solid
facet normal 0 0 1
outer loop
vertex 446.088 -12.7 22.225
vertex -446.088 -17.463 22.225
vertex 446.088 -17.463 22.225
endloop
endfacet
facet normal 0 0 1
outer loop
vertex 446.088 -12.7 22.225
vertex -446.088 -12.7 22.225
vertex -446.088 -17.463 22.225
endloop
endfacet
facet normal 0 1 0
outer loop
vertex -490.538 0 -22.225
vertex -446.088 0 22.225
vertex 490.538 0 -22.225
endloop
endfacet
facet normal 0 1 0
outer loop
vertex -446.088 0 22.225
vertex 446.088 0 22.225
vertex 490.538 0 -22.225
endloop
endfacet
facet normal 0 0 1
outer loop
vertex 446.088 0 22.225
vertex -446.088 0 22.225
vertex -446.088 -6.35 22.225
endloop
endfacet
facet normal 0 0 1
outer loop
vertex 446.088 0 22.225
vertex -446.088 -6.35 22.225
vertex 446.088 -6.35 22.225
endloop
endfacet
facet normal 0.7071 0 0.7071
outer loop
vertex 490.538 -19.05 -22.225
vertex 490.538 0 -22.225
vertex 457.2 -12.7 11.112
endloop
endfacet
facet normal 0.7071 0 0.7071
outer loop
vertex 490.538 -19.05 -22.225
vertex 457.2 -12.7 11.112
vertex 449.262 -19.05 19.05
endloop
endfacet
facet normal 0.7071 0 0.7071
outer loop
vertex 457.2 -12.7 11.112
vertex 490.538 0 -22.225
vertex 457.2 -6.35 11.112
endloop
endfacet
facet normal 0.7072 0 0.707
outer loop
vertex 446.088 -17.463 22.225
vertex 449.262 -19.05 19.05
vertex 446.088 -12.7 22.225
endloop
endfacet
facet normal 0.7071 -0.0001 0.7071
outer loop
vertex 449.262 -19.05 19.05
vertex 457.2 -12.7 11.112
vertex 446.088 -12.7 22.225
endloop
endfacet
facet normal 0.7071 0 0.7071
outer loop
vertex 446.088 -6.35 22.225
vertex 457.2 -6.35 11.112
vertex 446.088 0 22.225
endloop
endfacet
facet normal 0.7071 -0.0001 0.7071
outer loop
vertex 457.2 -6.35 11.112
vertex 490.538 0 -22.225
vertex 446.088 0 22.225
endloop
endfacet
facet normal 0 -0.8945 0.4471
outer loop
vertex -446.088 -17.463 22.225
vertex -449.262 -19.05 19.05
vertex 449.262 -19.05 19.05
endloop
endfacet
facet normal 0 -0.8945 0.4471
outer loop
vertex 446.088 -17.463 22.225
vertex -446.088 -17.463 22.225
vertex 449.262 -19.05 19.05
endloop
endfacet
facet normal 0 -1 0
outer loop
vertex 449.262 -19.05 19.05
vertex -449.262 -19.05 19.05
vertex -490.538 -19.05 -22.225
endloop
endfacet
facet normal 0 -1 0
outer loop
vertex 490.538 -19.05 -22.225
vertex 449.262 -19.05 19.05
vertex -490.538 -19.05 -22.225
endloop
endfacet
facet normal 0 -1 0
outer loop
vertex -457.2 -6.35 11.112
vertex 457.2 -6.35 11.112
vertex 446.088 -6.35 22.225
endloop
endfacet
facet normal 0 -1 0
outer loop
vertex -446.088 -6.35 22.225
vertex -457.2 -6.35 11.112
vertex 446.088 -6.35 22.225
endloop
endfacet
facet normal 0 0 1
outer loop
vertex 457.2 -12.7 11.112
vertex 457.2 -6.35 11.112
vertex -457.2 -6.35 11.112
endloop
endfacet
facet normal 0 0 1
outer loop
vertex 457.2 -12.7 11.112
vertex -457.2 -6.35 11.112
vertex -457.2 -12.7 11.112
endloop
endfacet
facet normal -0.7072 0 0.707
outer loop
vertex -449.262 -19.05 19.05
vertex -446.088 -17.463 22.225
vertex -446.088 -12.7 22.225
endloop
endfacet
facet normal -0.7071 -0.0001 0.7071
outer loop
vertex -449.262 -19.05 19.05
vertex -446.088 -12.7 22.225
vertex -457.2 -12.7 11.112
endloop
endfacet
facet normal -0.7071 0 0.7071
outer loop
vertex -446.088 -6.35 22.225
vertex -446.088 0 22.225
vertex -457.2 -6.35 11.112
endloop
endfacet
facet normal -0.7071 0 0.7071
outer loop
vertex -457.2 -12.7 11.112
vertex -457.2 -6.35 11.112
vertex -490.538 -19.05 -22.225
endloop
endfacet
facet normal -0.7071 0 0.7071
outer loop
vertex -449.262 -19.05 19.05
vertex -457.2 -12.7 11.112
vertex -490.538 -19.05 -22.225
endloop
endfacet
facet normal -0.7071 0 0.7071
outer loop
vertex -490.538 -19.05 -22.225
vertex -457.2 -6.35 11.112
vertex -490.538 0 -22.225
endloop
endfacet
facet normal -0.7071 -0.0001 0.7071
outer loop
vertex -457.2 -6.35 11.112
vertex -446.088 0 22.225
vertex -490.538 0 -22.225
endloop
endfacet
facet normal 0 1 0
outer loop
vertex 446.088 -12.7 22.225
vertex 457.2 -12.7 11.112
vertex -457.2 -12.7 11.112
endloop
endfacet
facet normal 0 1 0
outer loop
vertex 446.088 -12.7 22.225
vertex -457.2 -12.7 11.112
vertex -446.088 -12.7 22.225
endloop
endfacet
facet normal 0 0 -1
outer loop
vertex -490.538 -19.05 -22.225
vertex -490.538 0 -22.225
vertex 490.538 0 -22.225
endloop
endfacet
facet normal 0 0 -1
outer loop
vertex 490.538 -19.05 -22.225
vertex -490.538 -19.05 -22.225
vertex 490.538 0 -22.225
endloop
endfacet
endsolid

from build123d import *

# Parameters (mm, degrees)
F0_W     = 981.075
F0_H     = 44.45
F1_DEPTH = 19.05
F2_W     = 6.35
F2_H     = 11.1125
F3_DEPTH = 981.076
F4_SIZE2 = 3.175
F4_SIZE  = 1.5875
F6_DEPTH = 19.051


with BuildPart() as f1:
    # F0 (on Front) → F1 (new body)
    with BuildSketch(Plane.XZ):
        Rectangle(F0_W, F0_H)
    extrude(amount=F1_DEPTH)

    # F2 (on face) → F3 (cut, through all)
    with BuildSketch(Plane(origin=(-490.5375, 0, 0), x_dir=(0, -1, 0), z_dir=(-1, 0, 0))):
        with Locations((9.525, 16.66875)):
            Rectangle(F2_W, F2_H)
    extrude(amount=-F3_DEPTH, mode=Mode.SUBTRACT)

    # F4
    f4_edges = [f1.edges().sort_by_distance(p)[0] for p in [
        (0, -19.05, 22.225),
    ]]
    chamfer(f4_edges, length=F4_SIZE, length2=F4_SIZE2)

    # F5 (on face) → F6 (cut, through all)
    with BuildSketch(Plane(origin=(0, 0, 0), x_dir=(-1, 0, 0), z_dir=(0, 1, 0))):
        Polygon((-490.5375, 22.225), (-490.5375, -22.225), (-446.0875, 22.225), align=None)
        Polygon((446.0875, 22.225), (490.5375, -22.225), (490.5375, 22.225), align=None)
    extrude(amount=-F6_DEPTH, mode=Mode.SUBTRACT)


solid = f1.part
